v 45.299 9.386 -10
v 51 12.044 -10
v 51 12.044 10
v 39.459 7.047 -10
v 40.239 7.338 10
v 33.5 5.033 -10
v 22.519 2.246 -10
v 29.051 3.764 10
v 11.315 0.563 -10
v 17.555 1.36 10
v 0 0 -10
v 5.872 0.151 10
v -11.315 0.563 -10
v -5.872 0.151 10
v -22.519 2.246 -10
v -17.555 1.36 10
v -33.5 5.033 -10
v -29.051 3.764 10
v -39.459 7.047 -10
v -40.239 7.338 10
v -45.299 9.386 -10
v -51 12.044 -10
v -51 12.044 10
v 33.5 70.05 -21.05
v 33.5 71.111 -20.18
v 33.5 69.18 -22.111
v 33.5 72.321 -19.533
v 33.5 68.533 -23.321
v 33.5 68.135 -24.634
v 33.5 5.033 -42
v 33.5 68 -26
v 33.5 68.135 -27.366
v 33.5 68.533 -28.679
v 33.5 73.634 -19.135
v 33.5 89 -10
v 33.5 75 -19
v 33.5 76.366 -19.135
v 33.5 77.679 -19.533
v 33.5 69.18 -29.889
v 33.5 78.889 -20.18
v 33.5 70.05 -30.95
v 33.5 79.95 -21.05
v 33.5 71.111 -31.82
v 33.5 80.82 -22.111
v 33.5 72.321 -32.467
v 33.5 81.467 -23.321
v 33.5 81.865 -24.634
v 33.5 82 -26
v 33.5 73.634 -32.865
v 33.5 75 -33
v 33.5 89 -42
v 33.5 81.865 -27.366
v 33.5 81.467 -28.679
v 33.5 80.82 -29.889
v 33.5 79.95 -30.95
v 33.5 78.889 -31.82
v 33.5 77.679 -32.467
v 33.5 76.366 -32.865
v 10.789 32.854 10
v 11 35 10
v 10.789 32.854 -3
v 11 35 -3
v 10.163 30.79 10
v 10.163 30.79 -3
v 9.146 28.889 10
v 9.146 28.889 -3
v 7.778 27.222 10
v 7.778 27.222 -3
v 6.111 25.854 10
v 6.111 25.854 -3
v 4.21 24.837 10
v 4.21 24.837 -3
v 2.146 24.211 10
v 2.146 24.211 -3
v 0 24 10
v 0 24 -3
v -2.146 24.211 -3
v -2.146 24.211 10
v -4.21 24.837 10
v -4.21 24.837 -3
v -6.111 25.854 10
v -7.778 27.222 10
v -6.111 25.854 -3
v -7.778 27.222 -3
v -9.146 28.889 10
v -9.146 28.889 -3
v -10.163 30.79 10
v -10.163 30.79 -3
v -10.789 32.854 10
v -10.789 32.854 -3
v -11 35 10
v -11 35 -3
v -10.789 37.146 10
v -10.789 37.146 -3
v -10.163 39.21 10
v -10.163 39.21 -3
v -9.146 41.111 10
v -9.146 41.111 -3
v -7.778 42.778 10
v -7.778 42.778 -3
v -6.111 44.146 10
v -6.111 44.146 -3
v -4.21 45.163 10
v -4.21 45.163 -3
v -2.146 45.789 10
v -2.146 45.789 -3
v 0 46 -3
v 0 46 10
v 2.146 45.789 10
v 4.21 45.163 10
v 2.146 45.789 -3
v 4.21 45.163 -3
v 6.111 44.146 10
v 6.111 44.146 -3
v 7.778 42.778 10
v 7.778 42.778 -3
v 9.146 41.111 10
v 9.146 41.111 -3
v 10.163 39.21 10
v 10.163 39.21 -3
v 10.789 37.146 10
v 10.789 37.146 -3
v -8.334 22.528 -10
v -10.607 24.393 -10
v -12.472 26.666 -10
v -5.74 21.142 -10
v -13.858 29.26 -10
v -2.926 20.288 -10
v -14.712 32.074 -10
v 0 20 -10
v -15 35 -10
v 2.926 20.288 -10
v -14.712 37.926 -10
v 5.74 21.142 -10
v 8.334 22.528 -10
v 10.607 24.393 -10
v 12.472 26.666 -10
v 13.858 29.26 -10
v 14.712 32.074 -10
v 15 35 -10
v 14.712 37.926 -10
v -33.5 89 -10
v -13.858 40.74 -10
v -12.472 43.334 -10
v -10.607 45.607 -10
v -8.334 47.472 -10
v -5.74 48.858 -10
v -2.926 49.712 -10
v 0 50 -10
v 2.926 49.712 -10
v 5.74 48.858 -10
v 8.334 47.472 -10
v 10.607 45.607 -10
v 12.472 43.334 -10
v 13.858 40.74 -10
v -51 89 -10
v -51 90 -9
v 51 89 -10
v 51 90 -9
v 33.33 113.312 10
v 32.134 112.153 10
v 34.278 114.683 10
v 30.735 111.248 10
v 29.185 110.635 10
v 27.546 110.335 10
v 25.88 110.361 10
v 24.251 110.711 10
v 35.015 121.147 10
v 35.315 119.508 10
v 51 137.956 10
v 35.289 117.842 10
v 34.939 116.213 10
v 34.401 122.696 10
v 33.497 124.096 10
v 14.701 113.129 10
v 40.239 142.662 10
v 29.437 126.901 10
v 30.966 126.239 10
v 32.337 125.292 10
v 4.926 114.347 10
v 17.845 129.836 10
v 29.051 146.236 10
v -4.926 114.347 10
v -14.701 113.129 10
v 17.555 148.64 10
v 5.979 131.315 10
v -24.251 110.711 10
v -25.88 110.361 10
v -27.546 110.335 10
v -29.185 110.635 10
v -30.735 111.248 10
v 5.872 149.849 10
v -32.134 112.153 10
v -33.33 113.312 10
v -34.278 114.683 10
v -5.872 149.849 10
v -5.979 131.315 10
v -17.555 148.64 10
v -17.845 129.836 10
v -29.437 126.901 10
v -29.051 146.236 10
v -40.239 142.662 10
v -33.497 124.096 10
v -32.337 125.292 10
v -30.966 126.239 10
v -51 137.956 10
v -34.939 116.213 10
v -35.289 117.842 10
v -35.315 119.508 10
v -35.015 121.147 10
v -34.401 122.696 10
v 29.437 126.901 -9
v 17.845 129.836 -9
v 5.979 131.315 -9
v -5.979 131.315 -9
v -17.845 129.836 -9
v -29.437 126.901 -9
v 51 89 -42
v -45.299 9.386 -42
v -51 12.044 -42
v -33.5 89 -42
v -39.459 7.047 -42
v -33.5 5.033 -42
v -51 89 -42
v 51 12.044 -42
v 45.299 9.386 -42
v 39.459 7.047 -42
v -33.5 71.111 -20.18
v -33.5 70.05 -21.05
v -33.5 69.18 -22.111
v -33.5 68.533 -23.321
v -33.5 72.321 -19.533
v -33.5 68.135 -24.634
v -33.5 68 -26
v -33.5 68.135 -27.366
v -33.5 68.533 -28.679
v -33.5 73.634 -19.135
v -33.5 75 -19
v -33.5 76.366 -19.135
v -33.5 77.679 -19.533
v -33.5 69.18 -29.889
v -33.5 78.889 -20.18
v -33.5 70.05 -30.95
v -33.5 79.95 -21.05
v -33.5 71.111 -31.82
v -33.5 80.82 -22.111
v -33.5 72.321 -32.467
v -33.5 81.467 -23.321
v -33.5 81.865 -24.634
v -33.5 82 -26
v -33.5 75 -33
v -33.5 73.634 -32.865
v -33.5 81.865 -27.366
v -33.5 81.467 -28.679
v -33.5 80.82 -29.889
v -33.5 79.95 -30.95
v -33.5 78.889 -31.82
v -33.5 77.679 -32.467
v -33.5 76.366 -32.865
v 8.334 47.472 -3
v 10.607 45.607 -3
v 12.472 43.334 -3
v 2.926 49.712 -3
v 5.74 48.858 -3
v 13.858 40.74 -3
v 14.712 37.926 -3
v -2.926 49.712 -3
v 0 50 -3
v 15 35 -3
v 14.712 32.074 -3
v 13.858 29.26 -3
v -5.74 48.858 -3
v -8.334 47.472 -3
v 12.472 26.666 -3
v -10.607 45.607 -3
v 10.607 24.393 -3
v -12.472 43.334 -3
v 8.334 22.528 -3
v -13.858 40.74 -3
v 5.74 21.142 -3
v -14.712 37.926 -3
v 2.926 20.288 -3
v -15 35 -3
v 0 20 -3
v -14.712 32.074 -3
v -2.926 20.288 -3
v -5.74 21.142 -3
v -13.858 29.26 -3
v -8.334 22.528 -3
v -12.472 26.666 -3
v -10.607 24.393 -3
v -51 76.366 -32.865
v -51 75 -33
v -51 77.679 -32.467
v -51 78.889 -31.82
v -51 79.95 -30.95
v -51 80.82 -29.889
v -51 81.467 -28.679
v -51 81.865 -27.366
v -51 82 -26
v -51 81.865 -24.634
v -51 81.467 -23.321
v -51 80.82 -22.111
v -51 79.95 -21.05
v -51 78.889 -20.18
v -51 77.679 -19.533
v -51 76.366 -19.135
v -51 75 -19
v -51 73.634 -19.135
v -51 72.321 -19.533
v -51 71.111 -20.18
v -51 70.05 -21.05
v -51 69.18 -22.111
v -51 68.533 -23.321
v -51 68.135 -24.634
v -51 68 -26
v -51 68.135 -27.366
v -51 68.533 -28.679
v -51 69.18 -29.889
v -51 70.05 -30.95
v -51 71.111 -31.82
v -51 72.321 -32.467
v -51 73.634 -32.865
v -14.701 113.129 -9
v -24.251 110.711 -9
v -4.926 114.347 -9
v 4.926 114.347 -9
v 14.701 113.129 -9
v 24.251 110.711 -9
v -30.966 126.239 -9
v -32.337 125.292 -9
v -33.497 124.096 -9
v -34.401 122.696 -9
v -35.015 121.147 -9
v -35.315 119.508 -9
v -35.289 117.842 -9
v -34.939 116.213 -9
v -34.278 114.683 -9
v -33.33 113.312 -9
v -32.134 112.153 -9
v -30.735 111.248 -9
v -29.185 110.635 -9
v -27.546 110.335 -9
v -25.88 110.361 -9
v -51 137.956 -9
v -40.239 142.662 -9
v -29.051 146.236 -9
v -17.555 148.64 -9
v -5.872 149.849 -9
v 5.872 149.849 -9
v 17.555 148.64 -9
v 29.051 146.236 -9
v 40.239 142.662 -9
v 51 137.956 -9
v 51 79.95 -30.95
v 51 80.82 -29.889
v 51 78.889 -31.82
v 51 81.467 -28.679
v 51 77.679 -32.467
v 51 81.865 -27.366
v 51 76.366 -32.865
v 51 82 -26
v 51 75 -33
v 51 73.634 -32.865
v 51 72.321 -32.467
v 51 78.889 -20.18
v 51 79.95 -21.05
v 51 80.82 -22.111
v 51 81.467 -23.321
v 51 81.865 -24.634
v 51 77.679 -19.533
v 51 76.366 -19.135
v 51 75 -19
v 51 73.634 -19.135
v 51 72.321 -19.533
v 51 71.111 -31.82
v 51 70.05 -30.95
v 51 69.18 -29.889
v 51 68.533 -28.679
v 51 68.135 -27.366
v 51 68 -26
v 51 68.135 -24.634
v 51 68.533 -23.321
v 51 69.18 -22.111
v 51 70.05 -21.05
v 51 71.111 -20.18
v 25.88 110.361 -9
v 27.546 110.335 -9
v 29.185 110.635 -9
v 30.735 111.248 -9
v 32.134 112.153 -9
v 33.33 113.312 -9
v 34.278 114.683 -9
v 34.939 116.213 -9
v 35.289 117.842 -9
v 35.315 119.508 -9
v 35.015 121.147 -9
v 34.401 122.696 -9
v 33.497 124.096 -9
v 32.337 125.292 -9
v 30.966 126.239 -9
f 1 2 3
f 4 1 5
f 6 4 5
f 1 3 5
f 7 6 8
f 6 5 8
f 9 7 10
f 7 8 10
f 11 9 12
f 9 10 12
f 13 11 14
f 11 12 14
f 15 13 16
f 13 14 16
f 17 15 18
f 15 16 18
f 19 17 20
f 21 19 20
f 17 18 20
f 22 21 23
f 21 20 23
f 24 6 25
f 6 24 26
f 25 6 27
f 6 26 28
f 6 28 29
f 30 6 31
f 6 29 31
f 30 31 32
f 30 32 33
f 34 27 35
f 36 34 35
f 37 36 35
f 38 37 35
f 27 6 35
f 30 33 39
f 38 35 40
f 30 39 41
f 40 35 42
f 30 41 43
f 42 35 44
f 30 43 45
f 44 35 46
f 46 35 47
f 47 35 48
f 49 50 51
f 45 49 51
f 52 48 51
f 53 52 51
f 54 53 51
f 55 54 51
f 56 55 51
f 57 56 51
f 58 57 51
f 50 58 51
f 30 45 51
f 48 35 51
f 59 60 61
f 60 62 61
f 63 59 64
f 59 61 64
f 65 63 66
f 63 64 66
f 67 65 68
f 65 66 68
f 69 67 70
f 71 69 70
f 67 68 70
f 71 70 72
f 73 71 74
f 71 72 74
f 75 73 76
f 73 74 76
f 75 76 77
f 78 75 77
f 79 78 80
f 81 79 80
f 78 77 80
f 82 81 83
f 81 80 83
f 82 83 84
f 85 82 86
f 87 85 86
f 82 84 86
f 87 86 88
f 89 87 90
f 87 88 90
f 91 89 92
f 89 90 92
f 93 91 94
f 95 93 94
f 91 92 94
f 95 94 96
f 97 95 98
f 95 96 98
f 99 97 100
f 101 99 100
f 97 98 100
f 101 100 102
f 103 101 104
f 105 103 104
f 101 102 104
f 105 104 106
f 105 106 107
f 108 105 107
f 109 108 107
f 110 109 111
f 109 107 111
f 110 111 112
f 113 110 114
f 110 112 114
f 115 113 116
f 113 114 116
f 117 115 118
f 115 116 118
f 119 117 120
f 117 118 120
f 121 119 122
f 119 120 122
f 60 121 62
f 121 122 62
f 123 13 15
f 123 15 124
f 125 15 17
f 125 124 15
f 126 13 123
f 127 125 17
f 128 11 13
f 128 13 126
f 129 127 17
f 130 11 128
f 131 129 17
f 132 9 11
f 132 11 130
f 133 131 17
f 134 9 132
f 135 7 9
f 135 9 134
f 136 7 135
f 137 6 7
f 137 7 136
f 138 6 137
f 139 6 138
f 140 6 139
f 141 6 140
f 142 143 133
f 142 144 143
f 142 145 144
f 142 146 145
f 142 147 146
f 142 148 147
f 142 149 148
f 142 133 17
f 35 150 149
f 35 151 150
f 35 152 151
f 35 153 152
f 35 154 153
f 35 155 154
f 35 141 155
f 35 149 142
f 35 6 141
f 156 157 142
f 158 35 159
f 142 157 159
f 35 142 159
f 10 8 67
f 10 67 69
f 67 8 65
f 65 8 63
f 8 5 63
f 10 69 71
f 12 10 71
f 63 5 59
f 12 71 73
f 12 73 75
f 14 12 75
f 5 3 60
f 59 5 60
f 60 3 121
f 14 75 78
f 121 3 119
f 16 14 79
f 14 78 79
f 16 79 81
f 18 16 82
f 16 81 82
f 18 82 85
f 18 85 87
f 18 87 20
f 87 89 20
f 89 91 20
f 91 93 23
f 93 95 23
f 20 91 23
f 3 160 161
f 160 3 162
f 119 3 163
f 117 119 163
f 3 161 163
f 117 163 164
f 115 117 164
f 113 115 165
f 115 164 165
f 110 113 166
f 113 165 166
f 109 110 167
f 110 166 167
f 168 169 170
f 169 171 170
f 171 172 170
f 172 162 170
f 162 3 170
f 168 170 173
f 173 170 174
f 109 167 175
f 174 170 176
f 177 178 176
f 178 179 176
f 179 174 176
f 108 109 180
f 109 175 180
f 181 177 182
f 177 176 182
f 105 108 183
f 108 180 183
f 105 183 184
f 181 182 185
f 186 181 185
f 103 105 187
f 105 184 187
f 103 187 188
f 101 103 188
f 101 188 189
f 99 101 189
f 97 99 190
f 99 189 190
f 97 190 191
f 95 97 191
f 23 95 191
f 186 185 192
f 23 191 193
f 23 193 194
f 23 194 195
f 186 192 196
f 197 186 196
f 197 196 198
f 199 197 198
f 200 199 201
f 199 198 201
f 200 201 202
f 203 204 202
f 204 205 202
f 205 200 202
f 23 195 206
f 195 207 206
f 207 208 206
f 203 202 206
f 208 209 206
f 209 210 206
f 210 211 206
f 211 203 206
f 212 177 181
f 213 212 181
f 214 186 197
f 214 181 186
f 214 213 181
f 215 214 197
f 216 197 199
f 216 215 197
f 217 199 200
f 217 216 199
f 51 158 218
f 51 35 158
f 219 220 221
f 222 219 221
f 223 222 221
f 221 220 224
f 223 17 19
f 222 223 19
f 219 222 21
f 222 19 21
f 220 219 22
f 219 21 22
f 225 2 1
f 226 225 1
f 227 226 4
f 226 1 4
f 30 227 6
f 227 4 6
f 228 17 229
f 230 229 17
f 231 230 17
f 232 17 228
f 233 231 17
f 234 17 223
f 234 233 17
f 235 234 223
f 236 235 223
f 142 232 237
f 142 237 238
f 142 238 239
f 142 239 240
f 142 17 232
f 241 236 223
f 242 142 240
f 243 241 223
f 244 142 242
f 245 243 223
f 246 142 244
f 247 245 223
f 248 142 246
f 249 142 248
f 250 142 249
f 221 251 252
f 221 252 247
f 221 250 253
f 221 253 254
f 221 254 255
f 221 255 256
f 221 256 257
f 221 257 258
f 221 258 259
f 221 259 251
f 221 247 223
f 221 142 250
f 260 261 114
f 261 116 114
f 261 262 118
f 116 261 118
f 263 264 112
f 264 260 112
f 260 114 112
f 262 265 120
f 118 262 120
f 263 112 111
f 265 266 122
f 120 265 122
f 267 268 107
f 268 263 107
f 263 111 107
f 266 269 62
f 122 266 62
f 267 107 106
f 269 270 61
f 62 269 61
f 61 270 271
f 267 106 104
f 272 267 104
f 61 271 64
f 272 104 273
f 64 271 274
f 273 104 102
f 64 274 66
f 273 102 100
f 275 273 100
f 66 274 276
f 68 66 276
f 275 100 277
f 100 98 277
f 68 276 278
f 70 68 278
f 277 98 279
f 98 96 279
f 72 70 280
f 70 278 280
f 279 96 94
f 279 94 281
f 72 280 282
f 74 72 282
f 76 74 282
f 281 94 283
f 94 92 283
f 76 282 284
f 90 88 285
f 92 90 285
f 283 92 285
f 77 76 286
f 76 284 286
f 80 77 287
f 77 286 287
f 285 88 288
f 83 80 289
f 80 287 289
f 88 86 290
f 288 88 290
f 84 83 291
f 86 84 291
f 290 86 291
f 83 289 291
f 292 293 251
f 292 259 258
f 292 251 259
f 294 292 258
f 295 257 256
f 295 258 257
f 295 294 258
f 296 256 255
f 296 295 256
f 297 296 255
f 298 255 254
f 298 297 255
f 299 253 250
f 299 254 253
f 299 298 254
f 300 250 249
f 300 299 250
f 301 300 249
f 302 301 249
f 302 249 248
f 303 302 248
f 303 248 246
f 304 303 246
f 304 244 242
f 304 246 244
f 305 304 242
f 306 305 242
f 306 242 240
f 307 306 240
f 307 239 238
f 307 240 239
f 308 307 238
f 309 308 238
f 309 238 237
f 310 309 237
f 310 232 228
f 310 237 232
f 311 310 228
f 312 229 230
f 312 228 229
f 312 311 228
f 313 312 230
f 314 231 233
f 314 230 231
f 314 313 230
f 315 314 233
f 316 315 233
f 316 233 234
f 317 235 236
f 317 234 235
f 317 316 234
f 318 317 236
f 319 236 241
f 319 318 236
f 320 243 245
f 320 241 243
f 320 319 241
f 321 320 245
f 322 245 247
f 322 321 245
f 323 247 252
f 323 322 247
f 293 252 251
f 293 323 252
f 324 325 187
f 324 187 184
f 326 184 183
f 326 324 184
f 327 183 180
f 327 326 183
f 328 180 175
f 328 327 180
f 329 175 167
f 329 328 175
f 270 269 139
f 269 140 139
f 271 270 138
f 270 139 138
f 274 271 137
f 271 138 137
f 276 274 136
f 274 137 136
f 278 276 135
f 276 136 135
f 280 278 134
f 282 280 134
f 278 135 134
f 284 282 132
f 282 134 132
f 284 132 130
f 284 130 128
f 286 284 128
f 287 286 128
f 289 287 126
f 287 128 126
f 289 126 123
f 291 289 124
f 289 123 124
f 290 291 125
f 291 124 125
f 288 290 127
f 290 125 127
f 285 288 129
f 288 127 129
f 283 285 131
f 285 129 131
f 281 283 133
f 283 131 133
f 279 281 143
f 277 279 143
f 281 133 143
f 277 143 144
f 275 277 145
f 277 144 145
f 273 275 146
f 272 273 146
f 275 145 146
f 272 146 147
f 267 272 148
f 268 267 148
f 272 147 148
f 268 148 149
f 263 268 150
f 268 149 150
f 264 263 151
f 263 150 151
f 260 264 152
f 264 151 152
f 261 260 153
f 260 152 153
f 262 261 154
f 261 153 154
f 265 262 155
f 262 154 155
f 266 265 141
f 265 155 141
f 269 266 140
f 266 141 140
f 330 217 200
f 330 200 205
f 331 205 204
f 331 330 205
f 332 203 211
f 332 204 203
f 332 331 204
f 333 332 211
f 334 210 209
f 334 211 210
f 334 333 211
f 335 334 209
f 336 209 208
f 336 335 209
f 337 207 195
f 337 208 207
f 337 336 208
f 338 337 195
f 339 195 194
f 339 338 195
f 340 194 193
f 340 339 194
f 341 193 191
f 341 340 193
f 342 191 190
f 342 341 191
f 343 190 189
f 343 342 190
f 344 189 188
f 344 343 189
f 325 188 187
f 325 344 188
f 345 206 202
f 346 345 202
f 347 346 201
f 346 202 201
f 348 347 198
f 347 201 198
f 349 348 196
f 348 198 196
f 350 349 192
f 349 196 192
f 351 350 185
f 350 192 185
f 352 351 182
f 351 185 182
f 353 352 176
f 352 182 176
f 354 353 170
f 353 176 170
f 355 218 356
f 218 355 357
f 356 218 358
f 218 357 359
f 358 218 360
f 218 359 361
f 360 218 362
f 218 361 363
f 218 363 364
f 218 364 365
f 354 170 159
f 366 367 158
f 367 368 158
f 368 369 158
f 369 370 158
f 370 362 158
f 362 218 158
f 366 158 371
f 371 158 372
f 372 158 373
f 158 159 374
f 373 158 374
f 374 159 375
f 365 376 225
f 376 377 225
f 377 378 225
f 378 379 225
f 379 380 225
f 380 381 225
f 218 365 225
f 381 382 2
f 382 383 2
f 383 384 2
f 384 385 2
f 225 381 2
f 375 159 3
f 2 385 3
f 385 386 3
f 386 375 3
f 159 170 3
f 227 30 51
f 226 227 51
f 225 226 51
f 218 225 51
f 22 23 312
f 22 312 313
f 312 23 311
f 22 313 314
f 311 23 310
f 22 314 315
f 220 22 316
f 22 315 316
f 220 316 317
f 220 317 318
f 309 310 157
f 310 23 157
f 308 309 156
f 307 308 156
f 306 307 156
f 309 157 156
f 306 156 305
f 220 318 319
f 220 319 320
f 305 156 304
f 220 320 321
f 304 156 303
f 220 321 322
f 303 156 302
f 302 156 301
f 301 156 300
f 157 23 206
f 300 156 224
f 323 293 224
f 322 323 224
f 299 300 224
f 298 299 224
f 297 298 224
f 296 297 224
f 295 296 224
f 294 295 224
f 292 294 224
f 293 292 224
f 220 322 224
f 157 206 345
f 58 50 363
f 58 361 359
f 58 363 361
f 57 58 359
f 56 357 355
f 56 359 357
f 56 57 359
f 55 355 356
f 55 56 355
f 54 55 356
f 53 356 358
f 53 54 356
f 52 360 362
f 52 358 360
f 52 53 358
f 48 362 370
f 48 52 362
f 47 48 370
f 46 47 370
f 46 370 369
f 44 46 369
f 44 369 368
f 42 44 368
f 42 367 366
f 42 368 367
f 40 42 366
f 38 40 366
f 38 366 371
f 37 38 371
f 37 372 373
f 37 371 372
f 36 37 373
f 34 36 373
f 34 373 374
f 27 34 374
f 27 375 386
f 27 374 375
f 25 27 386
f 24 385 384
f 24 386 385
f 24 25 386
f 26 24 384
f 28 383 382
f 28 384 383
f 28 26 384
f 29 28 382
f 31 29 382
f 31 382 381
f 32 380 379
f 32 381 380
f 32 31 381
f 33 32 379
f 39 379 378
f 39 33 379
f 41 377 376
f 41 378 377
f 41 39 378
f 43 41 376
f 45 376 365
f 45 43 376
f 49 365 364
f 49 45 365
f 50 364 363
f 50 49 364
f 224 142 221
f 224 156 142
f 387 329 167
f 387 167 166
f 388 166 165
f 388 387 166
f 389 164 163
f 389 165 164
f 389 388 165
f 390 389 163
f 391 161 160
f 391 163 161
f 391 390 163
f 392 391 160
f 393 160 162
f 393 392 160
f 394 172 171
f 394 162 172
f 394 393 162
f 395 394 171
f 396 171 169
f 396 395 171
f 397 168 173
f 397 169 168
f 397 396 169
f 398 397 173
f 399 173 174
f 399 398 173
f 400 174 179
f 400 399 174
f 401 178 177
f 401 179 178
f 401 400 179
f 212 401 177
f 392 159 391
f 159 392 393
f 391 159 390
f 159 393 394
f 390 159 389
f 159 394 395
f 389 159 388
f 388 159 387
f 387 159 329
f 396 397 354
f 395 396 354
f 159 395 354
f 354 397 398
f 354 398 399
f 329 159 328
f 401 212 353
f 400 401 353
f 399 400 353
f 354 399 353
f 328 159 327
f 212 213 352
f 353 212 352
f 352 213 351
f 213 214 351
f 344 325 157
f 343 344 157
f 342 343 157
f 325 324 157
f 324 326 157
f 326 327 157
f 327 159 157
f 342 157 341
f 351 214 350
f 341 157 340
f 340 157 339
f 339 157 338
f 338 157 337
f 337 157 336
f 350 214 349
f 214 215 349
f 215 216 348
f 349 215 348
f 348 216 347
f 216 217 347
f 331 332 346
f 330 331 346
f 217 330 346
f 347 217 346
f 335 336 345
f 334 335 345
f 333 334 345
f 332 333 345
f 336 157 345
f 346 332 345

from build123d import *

# Parameters (mm, degrees)
Y_KSEKLIK_EKSTR_ZYON1_DEPTH      = 10
KES_EKSTR_ZYON1_DEPTH            = 159.748228337
KES_EKSTR_ZYON1_DEPTH_BACK       = 159.748228337
IZIM3_W                          = 1
IZIM3_H                          = 61
PAH1_SIZE                        = 1
Y_KSEKLIK_EKSTR_ZYON2_DEPTH      = 51
Y_KSEKLIK_EKSTR_ZYON2_DEPTH_BACK = 51
IZIM4_W                          = 32
IZIM4_H                          = 89
KES_EKSTR_ZYON2_DEPTH            = 162.632298752
IZIM8_W                          = 32
IZIM8_H                          = 89
KES_EKSTR_ZYON3_DEPTH            = 33.5
KES_EKSTR_ZYON4_DEPTH            = 164.905460556
KES_EKSTR_ZYON4_DEPTH_BACK       = 164.905460556
IZIM9_R                          = 7
KES_EKSTR_ZYON5_DEPTH            = 164.905460556
KES_EKSTR_ZYON5_DEPTH_BACK       = 164.905460556


with BuildPart() as part:
    # Çizim2 → Yükseklik-Ekstrüzyon1 (new, symmetric)
    with BuildSketch(Plane.XY):
        with BuildLine():
            Line((-51, 12.044127192), (-51, 137.955872808))
            ThreePointArc((-51, 137.955872808), (0, 150), (51, 137.955872808))
            Line((51, 137.955872808), (51, 12.044127192))
            ThreePointArc((51, 12.044127192), (0, 0), (-51, 12.044127192))
        make_face()
    extrude(amount=Y_KSEKLIK_EKSTR_ZYON1_DEPTH, both=True)

    # Çizim3 → Kes-Ekstrüzyon1 (cut, two sides: drawn at the far end of the back side and taken through both)
    with BuildSketch(Plane(origin=(0, 0, 0), x_dir=(0, 0, -1), z_dir=(1, 0, 0)).offset(-KES_EKSTR_ZYON1_DEPTH_BACK)):
        with Locations((9.5, 119.5)):
            Rectangle(IZIM3_W, IZIM3_H)
    extrude(amount=KES_EKSTR_ZYON1_DEPTH + KES_EKSTR_ZYON1_DEPTH_BACK, mode=Mode.SUBTRACT)

    # Pah1
    pah1_edges = [part.edges().sort_by_distance(p)[0] for p in [
        (0, 89, -9),
    ]]
    chamfer(pah1_edges, length=PAH1_SIZE - 0.0001)  # a hair under: the kernel refuses the full size

    # Çizim4 → Yükseklik-Ekstrüzyon2 (add, two sides: drawn at the far end of the back side and taken through both)
    with BuildSketch(Plane(origin=(0, 0, 0), x_dir=(0, 0, -1), z_dir=(1, 0, 0)).offset(-Y_KSEKLIK_EKSTR_ZYON2_DEPTH_BACK)):
        with Locations((26, 44.5)):
            Rectangle(IZIM4_W, IZIM4_H)
    extrude(amount=Y_KSEKLIK_EKSTR_ZYON2_DEPTH + Y_KSEKLIK_EKSTR_ZYON2_DEPTH_BACK)

    # Çizim7 → Kes-Ekstrüzyon2 (cut, through all)
    with BuildSketch(Plane.XY.offset(-10)):
        with BuildLine():
            ThreePointArc((0, 0), (-26.201436028, 3.051882621), (-51, 12.044127192))
            Line((-51, 12.044127192), (-51, 0))
            Line((-51, 0), (0, 0))
        make_face()
        with BuildLine():
            ThreePointArc((51, 12.044127192), (26.201436028, 3.051882621), (0, 0))
            Line((0, 0), (51, 0))
            Line((51, 0), (51, 12.044127192))
        make_face()
    extrude(amount=-KES_EKSTR_ZYON2_DEPTH, mode=Mode.SUBTRACT)

    # Çizim8 → Kes-Ekstrüzyon3 (cut, symmetric)
    with BuildSketch(Plane(origin=(0, 0, 0), x_dir=(0, 0, -1), z_dir=(1, 0, 0))):
        with Locations((26, 44.5)):
            Rectangle(IZIM8_W, IZIM8_H)
    extrude(amount=KES_EKSTR_ZYON3_DEPTH, both=True, mode=Mode.SUBTRACT)

    # Çizim9 → Kes-Ekstrüzyon4 (cut, two sides: drawn at the far end of the back side and taken through both)
    with BuildSketch(Plane(origin=(0, 0, 0), x_dir=(0, 0, -1), z_dir=(1, 0, 0)).offset(-KES_EKSTR_ZYON4_DEPTH_BACK)):
        with Locations((26, 75)):
            Circle(IZIM9_R)
    extrude(amount=KES_EKSTR_ZYON4_DEPTH + KES_EKSTR_ZYON4_DEPTH_BACK, mode=Mode.SUBTRACT)

    # Çizim10 → Kes-Döndür1 (revolve, cut)
    with BuildSketch(Plane(origin=(0, 0, 0), x_dir=(0, 0, -1), z_dir=(1, 0, 0)), mode=Mode.PRIVATE) as kes_d_nd_r1_sk:
        Polygon((-10, 35), (-10, 46), (3, 46), (3, 50), (10, 50), (10, 35), align=None)
    revolve(kes_d_nd_r1_sk.sketch.rotate(Axis((0, 35, 10), (0, 0, -1)), 90), axis=Axis((0, 35, 10), (0, 0, -1)), mode=Mode.SUBTRACT)

    # Çizim11 → Kes-Ekstrüzyon5 (cut, two sides: drawn at the far end of the back side and taken through both)
    with BuildSketch(Plane.XY.offset(-KES_EKSTR_ZYON5_DEPTH_BACK)):
        with BuildLine():
            ThreePointArc((29.436953678, 126.900575396), (0, 131.5), (-29.436953678, 126.900575396))
            ThreePointArc((-29.436953678, 126.900575396), (-34.938930721, 116.212813768), (-24.251169092, 110.710836725))
            ThreePointArc((-24.251169092, 110.710836725), (0, 114.5), (24.251169092, 110.710836725))
            ThreePointArc((24.251169092, 110.710836725), (34.938930721, 116.212813768), (29.436953678, 126.900575396))
        make_face()
    extrude(amount=KES_EKSTR_ZYON5_DEPTH + KES_EKSTR_ZYON5_DEPTH_BACK, mode=Mode.SUBTRACT)


solid = part.part
